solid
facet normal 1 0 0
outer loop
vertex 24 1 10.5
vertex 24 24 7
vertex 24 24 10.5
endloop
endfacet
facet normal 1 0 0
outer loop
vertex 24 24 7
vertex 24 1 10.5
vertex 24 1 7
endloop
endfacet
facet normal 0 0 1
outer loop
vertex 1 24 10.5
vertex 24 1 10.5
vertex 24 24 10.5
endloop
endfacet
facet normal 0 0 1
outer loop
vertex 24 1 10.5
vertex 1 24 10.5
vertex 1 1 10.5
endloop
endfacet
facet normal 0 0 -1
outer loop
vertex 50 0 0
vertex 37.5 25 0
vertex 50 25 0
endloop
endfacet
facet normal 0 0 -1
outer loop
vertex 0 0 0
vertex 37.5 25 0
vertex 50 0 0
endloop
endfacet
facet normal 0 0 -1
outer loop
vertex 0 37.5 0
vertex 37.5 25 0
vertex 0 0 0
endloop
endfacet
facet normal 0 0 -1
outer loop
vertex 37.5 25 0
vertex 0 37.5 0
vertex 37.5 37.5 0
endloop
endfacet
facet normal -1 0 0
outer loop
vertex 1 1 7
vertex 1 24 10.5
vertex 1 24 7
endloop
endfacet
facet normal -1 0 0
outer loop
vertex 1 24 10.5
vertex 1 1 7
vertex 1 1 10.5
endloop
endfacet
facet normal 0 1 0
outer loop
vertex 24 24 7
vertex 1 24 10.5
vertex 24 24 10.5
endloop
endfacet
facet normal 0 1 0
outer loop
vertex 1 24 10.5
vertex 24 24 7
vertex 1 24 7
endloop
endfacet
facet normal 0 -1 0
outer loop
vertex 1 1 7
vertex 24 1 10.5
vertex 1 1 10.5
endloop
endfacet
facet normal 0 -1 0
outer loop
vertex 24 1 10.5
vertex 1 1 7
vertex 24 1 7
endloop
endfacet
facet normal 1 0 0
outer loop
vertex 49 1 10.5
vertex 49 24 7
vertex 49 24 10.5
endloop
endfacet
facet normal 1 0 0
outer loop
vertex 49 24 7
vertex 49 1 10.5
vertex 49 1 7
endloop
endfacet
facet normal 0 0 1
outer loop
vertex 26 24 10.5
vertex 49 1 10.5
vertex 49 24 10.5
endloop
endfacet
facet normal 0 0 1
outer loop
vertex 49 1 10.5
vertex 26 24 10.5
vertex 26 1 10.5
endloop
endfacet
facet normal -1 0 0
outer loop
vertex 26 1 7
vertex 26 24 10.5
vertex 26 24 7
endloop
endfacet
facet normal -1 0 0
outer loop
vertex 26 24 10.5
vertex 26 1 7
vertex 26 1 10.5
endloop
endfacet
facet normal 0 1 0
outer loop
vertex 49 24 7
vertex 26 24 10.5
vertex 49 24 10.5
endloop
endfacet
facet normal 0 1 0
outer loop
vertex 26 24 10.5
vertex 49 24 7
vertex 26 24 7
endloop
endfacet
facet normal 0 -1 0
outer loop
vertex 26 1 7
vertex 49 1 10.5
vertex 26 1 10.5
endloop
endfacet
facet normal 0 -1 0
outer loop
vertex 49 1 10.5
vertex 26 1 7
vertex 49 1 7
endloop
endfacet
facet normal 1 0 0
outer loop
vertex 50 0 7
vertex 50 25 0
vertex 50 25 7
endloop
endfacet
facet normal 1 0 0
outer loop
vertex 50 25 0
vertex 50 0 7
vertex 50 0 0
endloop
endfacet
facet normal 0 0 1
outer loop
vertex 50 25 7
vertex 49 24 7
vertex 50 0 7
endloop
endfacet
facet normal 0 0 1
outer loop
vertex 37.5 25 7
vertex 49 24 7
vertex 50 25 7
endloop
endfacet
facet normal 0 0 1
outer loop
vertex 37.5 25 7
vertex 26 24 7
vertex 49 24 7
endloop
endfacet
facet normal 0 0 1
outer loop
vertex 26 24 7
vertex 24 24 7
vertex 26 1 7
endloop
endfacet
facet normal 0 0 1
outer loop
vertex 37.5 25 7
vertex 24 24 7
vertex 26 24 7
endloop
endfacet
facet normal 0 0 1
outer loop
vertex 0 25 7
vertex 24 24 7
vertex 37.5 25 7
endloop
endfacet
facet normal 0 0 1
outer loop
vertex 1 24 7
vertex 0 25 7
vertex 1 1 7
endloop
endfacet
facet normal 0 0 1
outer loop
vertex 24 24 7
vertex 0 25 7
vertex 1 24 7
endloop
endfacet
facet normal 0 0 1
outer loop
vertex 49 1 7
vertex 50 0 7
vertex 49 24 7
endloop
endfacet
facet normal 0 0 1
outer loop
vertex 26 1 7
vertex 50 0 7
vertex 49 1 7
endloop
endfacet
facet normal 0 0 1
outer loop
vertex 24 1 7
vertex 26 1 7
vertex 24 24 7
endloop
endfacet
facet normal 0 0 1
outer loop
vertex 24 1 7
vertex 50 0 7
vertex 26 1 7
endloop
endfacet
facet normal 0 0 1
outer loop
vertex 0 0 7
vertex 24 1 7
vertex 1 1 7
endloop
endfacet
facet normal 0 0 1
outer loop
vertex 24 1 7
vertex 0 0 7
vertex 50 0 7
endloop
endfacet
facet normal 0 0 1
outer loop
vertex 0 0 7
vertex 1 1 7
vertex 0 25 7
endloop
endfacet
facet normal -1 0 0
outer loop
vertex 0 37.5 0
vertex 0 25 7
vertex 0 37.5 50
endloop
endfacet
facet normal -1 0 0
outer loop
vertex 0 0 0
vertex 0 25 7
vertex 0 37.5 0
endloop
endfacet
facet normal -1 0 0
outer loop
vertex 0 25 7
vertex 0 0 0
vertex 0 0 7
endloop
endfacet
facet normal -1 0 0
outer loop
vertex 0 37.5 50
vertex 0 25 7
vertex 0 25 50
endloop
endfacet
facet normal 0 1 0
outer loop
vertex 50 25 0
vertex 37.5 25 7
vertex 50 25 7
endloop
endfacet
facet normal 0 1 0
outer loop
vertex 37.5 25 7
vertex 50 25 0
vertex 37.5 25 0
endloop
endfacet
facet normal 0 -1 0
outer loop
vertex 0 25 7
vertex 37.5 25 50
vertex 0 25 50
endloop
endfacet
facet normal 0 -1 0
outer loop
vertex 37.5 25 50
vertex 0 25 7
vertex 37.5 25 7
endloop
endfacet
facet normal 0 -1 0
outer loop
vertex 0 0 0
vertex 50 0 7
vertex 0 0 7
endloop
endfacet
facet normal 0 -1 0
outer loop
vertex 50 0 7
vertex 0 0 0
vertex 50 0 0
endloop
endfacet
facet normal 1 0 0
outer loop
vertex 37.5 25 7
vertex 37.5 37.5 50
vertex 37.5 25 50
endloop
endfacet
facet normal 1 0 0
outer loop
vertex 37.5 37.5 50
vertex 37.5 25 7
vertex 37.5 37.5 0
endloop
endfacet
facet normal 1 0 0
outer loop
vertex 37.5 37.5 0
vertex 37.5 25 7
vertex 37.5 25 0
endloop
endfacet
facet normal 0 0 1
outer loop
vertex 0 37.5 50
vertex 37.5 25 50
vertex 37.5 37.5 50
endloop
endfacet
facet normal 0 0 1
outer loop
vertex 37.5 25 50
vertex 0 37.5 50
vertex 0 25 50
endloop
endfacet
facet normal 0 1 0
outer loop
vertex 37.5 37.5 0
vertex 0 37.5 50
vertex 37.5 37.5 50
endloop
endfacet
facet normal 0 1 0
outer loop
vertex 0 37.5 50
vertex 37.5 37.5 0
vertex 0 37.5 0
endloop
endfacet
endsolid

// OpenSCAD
color("LightGray") {
    translate([1,1,0]) cube([23,23,6+4.5]);
    translate([25+1,1,0]) cube([23,23,6+4.5]);
}
color("Grey") {
    cube([50,25,7]);
    translate([0,25,0]) cube([50-12.5,12.5,50]);
}
